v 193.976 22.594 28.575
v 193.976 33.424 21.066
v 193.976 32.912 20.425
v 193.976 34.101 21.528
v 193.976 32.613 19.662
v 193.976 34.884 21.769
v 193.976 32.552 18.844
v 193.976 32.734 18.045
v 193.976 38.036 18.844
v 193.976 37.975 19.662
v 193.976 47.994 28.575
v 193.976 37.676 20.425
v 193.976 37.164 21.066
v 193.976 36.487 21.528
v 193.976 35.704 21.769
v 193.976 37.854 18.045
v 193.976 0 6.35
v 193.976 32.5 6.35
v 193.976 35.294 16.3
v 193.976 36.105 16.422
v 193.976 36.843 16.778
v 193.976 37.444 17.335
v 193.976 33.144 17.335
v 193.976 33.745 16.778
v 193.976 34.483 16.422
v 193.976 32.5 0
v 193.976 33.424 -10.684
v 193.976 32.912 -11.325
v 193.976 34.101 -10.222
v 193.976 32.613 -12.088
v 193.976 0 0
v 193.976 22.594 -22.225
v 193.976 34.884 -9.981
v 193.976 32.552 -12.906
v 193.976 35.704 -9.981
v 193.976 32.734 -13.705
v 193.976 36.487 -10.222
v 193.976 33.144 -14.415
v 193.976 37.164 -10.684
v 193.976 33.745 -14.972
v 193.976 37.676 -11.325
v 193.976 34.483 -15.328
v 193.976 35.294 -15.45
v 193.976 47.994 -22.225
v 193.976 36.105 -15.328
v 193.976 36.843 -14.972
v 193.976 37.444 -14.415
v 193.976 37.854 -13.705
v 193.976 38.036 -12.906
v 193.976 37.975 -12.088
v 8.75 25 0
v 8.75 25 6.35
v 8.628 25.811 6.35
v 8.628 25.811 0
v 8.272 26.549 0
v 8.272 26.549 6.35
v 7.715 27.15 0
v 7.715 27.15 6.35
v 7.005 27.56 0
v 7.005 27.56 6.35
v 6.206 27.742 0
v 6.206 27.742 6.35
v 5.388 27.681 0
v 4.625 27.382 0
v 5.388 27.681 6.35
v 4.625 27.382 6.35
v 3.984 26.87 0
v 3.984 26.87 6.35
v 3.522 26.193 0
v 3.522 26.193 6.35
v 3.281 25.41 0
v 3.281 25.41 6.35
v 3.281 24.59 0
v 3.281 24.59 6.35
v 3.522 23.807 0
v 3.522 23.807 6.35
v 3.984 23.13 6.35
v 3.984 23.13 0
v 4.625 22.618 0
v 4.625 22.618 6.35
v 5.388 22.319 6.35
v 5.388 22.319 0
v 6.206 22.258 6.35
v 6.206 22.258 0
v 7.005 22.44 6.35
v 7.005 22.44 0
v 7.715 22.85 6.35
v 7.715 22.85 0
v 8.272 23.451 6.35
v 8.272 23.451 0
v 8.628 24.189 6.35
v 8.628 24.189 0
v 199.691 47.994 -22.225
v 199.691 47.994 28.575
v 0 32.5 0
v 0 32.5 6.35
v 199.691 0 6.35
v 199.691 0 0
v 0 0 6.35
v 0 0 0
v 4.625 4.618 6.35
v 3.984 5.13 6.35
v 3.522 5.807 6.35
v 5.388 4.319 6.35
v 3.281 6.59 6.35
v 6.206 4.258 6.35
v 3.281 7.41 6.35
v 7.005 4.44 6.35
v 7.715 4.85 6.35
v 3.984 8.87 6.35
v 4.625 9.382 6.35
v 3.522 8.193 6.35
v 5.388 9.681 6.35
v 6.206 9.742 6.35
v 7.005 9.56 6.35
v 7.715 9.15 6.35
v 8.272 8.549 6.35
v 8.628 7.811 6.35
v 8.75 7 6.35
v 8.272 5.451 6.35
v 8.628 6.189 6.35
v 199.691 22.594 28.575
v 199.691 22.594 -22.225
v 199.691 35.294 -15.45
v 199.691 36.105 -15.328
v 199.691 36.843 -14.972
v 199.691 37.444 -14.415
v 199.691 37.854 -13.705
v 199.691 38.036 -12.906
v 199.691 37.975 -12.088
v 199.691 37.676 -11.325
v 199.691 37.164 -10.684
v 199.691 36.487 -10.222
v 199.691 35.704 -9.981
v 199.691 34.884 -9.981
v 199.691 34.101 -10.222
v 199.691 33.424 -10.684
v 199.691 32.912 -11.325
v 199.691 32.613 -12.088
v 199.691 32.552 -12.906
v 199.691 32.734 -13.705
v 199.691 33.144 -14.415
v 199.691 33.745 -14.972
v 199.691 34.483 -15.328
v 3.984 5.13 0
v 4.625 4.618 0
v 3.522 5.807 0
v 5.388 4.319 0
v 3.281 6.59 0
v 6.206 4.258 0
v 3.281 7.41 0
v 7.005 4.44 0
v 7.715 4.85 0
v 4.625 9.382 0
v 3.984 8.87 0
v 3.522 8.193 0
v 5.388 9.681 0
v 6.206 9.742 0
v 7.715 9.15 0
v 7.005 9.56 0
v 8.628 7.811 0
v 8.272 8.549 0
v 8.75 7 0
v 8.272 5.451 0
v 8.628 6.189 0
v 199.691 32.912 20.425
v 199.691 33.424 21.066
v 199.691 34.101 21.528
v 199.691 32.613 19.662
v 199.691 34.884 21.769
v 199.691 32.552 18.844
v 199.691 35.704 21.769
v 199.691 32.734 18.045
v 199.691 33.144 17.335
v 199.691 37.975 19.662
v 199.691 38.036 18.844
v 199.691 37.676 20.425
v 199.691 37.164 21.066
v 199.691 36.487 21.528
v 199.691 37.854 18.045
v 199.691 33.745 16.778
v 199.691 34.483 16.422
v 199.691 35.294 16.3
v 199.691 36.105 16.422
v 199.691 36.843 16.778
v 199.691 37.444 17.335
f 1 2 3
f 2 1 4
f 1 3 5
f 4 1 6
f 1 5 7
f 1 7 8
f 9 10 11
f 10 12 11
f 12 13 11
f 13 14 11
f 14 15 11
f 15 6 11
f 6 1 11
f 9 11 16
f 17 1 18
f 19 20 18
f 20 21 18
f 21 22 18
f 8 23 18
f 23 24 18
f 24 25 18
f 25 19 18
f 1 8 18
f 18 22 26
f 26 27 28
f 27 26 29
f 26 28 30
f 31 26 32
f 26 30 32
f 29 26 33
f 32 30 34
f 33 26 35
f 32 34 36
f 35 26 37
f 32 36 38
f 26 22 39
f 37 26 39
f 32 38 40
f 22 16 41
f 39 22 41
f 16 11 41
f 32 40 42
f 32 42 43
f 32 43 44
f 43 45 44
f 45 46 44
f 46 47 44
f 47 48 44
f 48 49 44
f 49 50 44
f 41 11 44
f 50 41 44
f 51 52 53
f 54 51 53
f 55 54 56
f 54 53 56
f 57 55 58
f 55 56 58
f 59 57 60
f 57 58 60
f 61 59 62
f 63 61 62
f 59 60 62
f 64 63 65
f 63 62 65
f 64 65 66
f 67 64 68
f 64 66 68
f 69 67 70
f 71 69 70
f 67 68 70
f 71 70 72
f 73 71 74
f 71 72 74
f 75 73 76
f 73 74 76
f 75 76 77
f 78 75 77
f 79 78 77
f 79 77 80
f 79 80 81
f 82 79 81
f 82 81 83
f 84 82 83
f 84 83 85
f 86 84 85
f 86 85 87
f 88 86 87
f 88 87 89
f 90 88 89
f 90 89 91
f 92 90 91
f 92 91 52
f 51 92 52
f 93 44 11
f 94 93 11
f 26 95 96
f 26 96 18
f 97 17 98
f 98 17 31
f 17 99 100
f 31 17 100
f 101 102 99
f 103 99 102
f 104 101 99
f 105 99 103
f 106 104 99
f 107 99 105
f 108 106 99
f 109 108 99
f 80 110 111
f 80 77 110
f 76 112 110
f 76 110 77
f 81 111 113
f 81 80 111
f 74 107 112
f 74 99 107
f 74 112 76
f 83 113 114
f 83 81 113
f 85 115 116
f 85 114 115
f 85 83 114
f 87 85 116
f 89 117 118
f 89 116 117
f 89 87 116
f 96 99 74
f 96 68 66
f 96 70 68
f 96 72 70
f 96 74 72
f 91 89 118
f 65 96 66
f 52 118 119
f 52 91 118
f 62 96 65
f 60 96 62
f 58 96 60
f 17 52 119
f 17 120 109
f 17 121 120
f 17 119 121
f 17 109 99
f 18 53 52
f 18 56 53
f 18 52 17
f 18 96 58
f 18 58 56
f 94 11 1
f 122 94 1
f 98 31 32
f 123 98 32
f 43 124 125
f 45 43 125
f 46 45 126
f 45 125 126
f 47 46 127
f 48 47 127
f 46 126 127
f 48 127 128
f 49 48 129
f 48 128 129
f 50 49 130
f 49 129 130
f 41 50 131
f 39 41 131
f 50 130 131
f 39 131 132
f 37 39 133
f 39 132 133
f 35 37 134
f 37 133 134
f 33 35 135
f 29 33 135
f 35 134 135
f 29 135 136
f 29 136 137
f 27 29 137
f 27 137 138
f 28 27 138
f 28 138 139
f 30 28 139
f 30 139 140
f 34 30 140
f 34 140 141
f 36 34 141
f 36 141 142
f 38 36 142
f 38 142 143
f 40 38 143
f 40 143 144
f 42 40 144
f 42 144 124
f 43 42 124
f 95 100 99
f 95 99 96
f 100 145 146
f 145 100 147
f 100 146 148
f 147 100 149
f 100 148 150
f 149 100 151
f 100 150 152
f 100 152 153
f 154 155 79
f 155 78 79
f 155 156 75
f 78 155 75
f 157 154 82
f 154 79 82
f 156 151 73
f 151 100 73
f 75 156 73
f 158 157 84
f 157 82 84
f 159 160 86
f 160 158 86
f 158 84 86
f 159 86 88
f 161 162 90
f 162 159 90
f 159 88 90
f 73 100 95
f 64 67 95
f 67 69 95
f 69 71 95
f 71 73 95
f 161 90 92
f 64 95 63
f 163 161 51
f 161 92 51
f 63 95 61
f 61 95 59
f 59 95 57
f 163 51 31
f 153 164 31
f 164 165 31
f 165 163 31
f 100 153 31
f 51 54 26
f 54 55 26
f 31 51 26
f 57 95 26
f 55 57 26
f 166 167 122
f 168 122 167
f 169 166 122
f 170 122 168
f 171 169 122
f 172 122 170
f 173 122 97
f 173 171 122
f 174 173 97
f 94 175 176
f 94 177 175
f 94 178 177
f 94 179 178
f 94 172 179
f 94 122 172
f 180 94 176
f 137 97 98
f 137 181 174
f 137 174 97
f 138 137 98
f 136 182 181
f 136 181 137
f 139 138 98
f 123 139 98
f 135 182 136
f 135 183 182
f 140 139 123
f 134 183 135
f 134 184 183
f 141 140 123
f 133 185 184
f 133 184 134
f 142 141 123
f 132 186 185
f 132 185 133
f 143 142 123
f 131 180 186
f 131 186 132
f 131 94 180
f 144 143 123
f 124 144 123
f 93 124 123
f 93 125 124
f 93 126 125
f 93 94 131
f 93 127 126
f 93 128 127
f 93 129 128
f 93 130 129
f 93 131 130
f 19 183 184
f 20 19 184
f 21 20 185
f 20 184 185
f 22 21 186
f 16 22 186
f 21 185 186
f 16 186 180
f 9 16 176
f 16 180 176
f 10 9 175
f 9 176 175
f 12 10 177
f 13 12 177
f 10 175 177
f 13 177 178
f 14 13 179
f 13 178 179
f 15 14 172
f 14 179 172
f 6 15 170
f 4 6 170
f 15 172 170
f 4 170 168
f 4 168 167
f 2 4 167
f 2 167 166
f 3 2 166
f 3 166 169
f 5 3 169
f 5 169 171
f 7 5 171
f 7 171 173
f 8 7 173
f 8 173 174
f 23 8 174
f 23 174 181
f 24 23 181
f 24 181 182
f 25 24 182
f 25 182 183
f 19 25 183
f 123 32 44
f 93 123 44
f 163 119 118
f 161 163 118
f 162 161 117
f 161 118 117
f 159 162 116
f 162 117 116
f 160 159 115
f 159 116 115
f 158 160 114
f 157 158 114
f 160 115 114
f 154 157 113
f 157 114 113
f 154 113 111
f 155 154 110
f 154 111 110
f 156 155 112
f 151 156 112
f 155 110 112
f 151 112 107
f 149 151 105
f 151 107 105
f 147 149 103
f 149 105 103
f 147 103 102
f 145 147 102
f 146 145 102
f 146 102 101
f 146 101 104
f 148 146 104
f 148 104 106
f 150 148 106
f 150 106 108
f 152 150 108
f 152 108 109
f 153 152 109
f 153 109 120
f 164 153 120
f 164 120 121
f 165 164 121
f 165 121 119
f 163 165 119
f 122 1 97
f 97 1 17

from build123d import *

# Parameters (mm, degrees)
SKETCH1_W           = 193.9764
SKETCH1_H           = 32.5
BOSS_EXTRUDE1_DEPTH = 6.35
SKETCH2_R           = 2.75
CUT_EXTRUDE1_DEPTH  = 197.782662491
BOSS_EXTRUDE2_DEPTH = 5.715
SKETCH4_R           = 2.75
CUT_EXTRUDE2_DEPTH  = 208.356239103


with BuildPart() as part:
    # Sketch1 → Boss-Extrude1 (new body)
    with BuildSketch(Plane.XY):
        with Locations((96.9882, 16.25)):
            Rectangle(SKETCH1_W, SKETCH1_H)
    extrude(amount=BOSS_EXTRUDE1_DEPTH)

    # Sketch2 → Cut-Extrude1 (cut, through all)
    with BuildSketch(Plane.XY.offset(6.35)):
        with Locations((6, 25)):
            Circle(SKETCH2_R)
        with Locations((6, 7)):
            Circle(SKETCH2_R)
    extrude(amount=-CUT_EXTRUDE1_DEPTH, mode=Mode.SUBTRACT)

    # Sketch3 → Boss-Extrude2 (add)
    with BuildSketch(Plane(origin=(193.9764, 0, 0), x_dir=(0, 0, -1), z_dir=(1, 0, 0))):
        Polygon((-28.575, 39.500902), (-28.575, 22.594), (22.225, 22.594), (22.225, 39.500902), (-3.175, 39.500902), align=None)
        Polygon((22.225, 22.594), (-28.575, 22.594), (-6.35, 0), (0, 0), align=None)
        Polygon((-28.575, 47.994), (-28.575, 39.500902), (-3.175, 39.500902), (22.225, 39.500902), (22.225, 47.994), align=None)
    extrude(amount=BOSS_EXTRUDE2_DEPTH)

    # Sketch4 → Cut-Extrude2 (cut, through all)
    with BuildSketch(Plane(origin=(199.6914, 0, 0), x_dir=(0, 0, -1), z_dir=(1, 0, 0))):
        with Locations((-19.05, 35.294)):
            Circle(SKETCH4_R)
        with Locations((12.7, 35.294)):
            Circle(SKETCH4_R)
    extrude(amount=-CUT_EXTRUDE2_DEPTH, mode=Mode.SUBTRACT)


solid = part.part
